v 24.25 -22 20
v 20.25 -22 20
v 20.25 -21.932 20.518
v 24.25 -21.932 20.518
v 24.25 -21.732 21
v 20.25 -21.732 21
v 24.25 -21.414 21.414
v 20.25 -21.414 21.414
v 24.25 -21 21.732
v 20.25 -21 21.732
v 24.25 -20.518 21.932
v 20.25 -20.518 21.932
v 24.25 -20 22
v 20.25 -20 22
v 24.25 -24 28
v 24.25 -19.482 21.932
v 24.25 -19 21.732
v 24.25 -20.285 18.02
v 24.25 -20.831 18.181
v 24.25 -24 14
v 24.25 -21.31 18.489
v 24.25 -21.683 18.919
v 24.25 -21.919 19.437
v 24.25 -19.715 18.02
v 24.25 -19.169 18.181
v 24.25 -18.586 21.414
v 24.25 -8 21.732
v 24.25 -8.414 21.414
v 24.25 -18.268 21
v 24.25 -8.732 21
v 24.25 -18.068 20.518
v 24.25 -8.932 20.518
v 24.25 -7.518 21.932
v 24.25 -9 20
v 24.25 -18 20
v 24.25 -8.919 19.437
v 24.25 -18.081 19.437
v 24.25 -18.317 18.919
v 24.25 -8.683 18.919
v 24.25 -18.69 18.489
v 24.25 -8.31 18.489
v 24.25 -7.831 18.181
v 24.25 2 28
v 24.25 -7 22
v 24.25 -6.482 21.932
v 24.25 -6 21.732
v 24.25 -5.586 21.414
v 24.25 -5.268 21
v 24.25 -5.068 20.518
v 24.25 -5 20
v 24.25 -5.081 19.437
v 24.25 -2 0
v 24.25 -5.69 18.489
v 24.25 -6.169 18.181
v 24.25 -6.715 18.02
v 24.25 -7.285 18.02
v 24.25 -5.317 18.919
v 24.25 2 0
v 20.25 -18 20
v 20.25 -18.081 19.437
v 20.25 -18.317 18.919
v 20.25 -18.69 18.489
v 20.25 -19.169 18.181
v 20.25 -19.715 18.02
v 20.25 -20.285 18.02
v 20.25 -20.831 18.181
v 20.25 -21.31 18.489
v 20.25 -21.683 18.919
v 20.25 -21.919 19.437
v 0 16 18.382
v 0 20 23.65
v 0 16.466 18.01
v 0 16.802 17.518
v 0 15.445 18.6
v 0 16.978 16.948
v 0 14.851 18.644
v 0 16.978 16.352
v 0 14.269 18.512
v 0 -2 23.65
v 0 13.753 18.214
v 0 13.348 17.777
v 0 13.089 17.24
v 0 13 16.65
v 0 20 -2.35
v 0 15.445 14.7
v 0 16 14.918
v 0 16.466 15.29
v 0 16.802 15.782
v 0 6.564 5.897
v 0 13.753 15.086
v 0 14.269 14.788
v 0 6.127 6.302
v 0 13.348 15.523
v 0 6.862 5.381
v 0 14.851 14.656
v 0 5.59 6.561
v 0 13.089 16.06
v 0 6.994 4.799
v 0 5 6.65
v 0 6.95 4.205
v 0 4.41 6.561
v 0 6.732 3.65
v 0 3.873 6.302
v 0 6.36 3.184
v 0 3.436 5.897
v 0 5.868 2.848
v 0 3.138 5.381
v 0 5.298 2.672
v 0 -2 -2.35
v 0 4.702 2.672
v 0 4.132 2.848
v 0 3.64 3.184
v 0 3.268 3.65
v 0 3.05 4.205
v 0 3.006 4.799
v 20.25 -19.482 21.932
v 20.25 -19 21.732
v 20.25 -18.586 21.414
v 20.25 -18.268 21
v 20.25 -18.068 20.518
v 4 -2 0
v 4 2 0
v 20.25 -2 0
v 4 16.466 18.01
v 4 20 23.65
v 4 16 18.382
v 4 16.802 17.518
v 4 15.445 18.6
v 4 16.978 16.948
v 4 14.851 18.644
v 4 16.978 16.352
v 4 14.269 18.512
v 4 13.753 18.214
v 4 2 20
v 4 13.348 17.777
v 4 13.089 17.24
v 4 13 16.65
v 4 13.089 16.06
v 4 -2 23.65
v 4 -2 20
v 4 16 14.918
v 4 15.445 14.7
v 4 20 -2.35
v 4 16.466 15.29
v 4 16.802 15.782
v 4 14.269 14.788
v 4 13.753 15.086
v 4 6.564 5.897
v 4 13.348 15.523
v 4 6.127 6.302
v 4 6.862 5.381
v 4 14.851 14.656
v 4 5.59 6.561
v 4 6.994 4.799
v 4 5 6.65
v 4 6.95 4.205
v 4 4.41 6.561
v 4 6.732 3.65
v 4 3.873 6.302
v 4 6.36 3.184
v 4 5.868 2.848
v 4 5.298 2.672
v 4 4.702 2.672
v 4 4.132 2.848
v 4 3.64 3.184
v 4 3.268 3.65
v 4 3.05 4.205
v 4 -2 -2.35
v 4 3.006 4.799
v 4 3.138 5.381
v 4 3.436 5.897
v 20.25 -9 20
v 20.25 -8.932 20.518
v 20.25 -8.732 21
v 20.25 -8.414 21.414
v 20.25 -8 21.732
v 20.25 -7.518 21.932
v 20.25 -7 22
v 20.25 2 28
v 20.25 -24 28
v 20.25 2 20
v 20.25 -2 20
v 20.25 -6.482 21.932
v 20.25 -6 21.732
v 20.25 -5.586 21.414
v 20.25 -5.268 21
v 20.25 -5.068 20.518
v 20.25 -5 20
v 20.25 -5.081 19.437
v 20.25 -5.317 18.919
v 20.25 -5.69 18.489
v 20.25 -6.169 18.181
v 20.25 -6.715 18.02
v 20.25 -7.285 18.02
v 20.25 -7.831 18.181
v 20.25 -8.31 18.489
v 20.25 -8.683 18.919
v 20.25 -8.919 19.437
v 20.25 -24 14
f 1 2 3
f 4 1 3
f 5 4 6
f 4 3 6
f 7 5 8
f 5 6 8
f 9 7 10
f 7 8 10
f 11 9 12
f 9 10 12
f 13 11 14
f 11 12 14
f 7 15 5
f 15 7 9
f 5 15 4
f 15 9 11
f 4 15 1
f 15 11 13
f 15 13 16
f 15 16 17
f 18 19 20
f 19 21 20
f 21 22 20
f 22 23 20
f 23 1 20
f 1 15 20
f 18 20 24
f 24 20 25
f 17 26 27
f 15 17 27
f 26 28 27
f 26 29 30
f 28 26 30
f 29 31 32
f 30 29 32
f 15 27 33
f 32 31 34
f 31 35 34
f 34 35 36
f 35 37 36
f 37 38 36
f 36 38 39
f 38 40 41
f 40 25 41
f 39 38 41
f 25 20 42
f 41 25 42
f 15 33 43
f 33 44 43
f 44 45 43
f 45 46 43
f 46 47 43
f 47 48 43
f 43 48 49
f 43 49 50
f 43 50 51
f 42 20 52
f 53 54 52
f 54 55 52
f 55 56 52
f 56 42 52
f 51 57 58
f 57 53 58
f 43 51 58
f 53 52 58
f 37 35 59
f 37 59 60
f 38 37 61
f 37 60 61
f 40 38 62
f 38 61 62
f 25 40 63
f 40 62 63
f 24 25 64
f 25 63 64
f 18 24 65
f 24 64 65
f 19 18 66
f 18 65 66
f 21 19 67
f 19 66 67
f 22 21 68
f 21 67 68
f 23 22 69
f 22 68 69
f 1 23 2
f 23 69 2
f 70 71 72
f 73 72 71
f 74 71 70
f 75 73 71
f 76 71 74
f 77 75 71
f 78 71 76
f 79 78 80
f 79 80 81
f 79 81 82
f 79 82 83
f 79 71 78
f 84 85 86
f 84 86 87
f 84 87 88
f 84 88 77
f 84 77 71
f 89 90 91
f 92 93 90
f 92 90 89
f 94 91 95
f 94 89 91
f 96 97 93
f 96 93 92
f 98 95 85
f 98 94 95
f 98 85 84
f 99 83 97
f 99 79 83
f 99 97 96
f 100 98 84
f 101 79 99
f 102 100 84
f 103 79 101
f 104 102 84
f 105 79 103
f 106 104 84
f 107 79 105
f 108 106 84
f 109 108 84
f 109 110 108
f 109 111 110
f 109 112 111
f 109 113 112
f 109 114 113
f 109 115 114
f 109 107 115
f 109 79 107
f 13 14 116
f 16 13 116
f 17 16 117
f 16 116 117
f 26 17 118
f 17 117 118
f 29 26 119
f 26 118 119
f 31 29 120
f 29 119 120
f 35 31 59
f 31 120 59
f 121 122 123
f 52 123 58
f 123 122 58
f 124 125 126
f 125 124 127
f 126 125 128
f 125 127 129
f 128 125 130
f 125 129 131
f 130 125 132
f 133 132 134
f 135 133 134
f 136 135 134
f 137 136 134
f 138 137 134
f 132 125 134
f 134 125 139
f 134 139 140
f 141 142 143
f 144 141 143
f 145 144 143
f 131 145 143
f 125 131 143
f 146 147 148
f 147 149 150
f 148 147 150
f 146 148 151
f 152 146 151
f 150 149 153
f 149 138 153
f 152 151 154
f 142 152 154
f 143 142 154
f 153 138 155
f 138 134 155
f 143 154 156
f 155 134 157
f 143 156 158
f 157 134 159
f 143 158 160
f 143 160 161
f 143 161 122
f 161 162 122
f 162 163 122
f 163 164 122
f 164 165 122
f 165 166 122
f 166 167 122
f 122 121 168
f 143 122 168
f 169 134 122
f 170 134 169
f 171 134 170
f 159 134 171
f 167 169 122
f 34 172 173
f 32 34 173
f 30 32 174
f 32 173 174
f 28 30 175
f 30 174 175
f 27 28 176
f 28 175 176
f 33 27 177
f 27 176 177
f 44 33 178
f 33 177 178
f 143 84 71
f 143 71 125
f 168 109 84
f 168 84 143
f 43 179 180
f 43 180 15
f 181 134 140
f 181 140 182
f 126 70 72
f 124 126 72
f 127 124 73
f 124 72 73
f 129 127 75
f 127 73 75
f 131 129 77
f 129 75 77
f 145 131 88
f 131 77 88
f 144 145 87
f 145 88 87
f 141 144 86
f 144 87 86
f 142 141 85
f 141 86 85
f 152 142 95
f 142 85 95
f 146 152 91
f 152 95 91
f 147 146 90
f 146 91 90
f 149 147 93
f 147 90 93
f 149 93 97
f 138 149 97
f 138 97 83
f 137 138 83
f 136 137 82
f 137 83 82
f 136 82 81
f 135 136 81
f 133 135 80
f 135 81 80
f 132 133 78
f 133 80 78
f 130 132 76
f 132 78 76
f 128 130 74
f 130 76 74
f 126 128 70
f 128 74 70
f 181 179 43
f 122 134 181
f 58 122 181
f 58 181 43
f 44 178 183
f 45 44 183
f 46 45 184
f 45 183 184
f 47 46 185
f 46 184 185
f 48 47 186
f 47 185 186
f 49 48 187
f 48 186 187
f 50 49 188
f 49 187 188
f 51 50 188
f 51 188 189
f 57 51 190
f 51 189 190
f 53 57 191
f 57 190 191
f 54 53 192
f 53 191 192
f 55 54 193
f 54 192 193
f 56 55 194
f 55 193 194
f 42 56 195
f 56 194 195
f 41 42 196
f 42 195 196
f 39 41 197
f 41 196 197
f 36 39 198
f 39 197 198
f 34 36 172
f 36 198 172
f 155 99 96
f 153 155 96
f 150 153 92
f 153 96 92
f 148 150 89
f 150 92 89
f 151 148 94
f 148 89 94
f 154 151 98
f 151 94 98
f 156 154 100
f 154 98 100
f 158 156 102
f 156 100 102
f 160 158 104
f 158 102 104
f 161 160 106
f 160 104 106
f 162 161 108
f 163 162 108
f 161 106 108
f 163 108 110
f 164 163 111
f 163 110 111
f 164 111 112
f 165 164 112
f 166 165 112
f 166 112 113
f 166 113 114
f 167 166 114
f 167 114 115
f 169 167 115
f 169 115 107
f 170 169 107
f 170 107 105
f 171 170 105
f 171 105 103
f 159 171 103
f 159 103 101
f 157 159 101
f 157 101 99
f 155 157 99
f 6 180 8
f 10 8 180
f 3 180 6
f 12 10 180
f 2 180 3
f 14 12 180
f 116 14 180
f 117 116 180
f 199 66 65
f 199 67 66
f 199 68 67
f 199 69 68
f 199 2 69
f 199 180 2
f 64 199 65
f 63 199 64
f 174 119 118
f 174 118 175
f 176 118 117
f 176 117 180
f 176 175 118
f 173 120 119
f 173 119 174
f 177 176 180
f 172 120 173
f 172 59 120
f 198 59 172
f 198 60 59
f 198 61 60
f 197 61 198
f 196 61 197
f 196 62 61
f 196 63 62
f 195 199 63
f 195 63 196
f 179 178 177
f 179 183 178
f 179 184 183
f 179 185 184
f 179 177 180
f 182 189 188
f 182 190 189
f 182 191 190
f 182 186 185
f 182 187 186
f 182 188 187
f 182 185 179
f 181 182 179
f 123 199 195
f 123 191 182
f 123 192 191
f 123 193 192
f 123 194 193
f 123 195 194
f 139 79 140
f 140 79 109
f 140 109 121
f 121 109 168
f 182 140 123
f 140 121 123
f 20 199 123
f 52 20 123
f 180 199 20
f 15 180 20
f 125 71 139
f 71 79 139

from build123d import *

# Parameters (mm, degrees)
BOSS_EXTRU_1_DEPTH      = 20
ESQUISSE3_W             = 4
ESQUISSE3_H             = 18
BOSS_EXTRU_2_DEPTH      = 20
ESQUISSE4_W             = 4
ESQUISSE4_H             = 18
BOSS_EXTRU_3_DEPTH      = 20
ESQUISSE5_W             = 17.65
ESQUISSE5_H             = 18
ESQUISSE5_W_2           = 16.35
ESQUISSE5_R             = 2
ENL_V_MAT_EXTRU_1_DEPTH = 20
ESQUISSE6_W             = 4
ESQUISSE6_H             = 26
BOSS_EXTRU_4_DEPTH      = 4
ESQUISSE7_R             = 2
ENL_V_MAT_EXTRU_2_DEPTH = 4
ESQUISSE8_R             = 2
ENL_V_MAT_EXTRU_3_DEPTH = 4
ESQUISSE9_W             = 4
ESQUISSE9_H             = 26
BOSS_EXTRU_5_DEPTH      = 8
ENL_V_MAT_EXTRU_5_DEPTH = 8


with BuildPart() as part:
    # Esquisse1 → Boss.-Extru.1 (new body)
    with BuildSketch(Plane.XY):
        Polygon((0, 16), (0, 0), (24.25, 0), (24.25, 2), (4, 2), (4, 16), align=None)
        Polygon((24.25, 0), (0, 0), (0, -2), (20.25, -2), (20.25, -24), (24.25, -24), align=None)
    extrude(amount=BOSS_EXTRU_1_DEPTH)

    # Esquisse3 → Boss.-Extru.2 (add)
    with BuildSketch(Plane(origin=(0, 0, 0), x_dir=(-1, 0, 0), z_dir=(0, 0, -1))):
        with Locations((-2, 7)):
            Rectangle(ESQUISSE3_W, ESQUISSE3_H)
    extrude(amount=BOSS_EXTRU_2_DEPTH)

    # Esquisse4 → Boss.-Extru.3 (add)
    with BuildSketch(Plane.XY.offset(20)):
        with Locations((2, 7)):
            Rectangle(ESQUISSE4_W, ESQUISSE4_H)
    extrude(amount=BOSS_EXTRU_3_DEPTH)

    # Esquisse5 → Enlèv. mat.-Extru.1 (cut)
    with BuildSketch(Plane.ZY):
        with Locations((-11.175, 7)):
            Rectangle(ESQUISSE5_W, ESQUISSE5_H)
        with Locations((31.825, 7)):
            Rectangle(ESQUISSE5_W_2, ESQUISSE5_H)
        with Locations((16.65, 15)):
            Circle(ESQUISSE5_R)
        with Locations((4.65, 5)):
            Circle(ESQUISSE5_R)
    extrude(amount=-ENL_V_MAT_EXTRU_1_DEPTH, mode=Mode.SUBTRACT)

    # Esquisse6 → Boss.-Extru.4 (add)
    with BuildSketch(Plane(origin=(0, 16, 0), x_dir=(1, 0, 0), z_dir=(0, 1, 0))):
        with Locations((2, -10.65)):
            Rectangle(ESQUISSE6_W, ESQUISSE6_H)
    extrude(amount=BOSS_EXTRU_4_DEPTH)

    # Esquisse7 → Enlèv. mat.-Extru.2 (cut)
    with BuildSketch(Plane.ZY):
        with Locations((16.65, 15)):
            Circle(ESQUISSE7_R)
    extrude(amount=-ENL_V_MAT_EXTRU_2_DEPTH, mode=Mode.SUBTRACT)

    # Esquisse8 → Enlèv. mat.-Extru.3 (cut)
    with BuildSketch(Plane.ZY.offset(-20.25)):
        with Locations((20, -7)):
            Circle(ESQUISSE8_R)
        with Locations((20, -20)):
            Circle(ESQUISSE8_R)
    extrude(amount=-ENL_V_MAT_EXTRU_3_DEPTH, mode=Mode.SUBTRACT)

    # Esquisse9 → Boss.-Extru.5 (add)
    with BuildSketch(Plane.XY.offset(20)):
        with Locations((22.25, -11)):
            Rectangle(ESQUISSE9_W, ESQUISSE9_H)
    extrude(amount=BOSS_EXTRU_5_DEPTH)

    # Esquisse11 → Enlèv. mat.-Extru.5 (cut)
    with BuildSketch(Plane.ZY.offset(-20.25)):
        with BuildLine():
            ThreePointArc((20, -9), (21.414213562, -8.414213562), (22, -7))
            ThreePointArc((22, -7), (21.414213562, -5.585786438), (20, -5))
            Line((20, -5), (20, -9))
        make_face()
        with BuildLine():
            Line((20, -9), (20, -5))
            ThreePointArc((20, -5), (18, -7), (20, -9))
        make_face()
        with BuildLine():
            ThreePointArc((20, -22), (21.414213562, -21.414213562), (22, -20))
            ThreePointArc((22, -20), (21.414213562, -18.585786438), (20, -18))
            Line((20, -18), (20, -22))
        make_face()
        with BuildLine():
            Line((20, -22), (20, -18))
            ThreePointArc((20, -18), (18, -20), (20, -22))
        make_face()
        Polygon((14, -24), (0, -2), (0, -24), align=None)
    extrude(amount=-ENL_V_MAT_EXTRU_5_DEPTH, mode=Mode.SUBTRACT)


solid = part.part
